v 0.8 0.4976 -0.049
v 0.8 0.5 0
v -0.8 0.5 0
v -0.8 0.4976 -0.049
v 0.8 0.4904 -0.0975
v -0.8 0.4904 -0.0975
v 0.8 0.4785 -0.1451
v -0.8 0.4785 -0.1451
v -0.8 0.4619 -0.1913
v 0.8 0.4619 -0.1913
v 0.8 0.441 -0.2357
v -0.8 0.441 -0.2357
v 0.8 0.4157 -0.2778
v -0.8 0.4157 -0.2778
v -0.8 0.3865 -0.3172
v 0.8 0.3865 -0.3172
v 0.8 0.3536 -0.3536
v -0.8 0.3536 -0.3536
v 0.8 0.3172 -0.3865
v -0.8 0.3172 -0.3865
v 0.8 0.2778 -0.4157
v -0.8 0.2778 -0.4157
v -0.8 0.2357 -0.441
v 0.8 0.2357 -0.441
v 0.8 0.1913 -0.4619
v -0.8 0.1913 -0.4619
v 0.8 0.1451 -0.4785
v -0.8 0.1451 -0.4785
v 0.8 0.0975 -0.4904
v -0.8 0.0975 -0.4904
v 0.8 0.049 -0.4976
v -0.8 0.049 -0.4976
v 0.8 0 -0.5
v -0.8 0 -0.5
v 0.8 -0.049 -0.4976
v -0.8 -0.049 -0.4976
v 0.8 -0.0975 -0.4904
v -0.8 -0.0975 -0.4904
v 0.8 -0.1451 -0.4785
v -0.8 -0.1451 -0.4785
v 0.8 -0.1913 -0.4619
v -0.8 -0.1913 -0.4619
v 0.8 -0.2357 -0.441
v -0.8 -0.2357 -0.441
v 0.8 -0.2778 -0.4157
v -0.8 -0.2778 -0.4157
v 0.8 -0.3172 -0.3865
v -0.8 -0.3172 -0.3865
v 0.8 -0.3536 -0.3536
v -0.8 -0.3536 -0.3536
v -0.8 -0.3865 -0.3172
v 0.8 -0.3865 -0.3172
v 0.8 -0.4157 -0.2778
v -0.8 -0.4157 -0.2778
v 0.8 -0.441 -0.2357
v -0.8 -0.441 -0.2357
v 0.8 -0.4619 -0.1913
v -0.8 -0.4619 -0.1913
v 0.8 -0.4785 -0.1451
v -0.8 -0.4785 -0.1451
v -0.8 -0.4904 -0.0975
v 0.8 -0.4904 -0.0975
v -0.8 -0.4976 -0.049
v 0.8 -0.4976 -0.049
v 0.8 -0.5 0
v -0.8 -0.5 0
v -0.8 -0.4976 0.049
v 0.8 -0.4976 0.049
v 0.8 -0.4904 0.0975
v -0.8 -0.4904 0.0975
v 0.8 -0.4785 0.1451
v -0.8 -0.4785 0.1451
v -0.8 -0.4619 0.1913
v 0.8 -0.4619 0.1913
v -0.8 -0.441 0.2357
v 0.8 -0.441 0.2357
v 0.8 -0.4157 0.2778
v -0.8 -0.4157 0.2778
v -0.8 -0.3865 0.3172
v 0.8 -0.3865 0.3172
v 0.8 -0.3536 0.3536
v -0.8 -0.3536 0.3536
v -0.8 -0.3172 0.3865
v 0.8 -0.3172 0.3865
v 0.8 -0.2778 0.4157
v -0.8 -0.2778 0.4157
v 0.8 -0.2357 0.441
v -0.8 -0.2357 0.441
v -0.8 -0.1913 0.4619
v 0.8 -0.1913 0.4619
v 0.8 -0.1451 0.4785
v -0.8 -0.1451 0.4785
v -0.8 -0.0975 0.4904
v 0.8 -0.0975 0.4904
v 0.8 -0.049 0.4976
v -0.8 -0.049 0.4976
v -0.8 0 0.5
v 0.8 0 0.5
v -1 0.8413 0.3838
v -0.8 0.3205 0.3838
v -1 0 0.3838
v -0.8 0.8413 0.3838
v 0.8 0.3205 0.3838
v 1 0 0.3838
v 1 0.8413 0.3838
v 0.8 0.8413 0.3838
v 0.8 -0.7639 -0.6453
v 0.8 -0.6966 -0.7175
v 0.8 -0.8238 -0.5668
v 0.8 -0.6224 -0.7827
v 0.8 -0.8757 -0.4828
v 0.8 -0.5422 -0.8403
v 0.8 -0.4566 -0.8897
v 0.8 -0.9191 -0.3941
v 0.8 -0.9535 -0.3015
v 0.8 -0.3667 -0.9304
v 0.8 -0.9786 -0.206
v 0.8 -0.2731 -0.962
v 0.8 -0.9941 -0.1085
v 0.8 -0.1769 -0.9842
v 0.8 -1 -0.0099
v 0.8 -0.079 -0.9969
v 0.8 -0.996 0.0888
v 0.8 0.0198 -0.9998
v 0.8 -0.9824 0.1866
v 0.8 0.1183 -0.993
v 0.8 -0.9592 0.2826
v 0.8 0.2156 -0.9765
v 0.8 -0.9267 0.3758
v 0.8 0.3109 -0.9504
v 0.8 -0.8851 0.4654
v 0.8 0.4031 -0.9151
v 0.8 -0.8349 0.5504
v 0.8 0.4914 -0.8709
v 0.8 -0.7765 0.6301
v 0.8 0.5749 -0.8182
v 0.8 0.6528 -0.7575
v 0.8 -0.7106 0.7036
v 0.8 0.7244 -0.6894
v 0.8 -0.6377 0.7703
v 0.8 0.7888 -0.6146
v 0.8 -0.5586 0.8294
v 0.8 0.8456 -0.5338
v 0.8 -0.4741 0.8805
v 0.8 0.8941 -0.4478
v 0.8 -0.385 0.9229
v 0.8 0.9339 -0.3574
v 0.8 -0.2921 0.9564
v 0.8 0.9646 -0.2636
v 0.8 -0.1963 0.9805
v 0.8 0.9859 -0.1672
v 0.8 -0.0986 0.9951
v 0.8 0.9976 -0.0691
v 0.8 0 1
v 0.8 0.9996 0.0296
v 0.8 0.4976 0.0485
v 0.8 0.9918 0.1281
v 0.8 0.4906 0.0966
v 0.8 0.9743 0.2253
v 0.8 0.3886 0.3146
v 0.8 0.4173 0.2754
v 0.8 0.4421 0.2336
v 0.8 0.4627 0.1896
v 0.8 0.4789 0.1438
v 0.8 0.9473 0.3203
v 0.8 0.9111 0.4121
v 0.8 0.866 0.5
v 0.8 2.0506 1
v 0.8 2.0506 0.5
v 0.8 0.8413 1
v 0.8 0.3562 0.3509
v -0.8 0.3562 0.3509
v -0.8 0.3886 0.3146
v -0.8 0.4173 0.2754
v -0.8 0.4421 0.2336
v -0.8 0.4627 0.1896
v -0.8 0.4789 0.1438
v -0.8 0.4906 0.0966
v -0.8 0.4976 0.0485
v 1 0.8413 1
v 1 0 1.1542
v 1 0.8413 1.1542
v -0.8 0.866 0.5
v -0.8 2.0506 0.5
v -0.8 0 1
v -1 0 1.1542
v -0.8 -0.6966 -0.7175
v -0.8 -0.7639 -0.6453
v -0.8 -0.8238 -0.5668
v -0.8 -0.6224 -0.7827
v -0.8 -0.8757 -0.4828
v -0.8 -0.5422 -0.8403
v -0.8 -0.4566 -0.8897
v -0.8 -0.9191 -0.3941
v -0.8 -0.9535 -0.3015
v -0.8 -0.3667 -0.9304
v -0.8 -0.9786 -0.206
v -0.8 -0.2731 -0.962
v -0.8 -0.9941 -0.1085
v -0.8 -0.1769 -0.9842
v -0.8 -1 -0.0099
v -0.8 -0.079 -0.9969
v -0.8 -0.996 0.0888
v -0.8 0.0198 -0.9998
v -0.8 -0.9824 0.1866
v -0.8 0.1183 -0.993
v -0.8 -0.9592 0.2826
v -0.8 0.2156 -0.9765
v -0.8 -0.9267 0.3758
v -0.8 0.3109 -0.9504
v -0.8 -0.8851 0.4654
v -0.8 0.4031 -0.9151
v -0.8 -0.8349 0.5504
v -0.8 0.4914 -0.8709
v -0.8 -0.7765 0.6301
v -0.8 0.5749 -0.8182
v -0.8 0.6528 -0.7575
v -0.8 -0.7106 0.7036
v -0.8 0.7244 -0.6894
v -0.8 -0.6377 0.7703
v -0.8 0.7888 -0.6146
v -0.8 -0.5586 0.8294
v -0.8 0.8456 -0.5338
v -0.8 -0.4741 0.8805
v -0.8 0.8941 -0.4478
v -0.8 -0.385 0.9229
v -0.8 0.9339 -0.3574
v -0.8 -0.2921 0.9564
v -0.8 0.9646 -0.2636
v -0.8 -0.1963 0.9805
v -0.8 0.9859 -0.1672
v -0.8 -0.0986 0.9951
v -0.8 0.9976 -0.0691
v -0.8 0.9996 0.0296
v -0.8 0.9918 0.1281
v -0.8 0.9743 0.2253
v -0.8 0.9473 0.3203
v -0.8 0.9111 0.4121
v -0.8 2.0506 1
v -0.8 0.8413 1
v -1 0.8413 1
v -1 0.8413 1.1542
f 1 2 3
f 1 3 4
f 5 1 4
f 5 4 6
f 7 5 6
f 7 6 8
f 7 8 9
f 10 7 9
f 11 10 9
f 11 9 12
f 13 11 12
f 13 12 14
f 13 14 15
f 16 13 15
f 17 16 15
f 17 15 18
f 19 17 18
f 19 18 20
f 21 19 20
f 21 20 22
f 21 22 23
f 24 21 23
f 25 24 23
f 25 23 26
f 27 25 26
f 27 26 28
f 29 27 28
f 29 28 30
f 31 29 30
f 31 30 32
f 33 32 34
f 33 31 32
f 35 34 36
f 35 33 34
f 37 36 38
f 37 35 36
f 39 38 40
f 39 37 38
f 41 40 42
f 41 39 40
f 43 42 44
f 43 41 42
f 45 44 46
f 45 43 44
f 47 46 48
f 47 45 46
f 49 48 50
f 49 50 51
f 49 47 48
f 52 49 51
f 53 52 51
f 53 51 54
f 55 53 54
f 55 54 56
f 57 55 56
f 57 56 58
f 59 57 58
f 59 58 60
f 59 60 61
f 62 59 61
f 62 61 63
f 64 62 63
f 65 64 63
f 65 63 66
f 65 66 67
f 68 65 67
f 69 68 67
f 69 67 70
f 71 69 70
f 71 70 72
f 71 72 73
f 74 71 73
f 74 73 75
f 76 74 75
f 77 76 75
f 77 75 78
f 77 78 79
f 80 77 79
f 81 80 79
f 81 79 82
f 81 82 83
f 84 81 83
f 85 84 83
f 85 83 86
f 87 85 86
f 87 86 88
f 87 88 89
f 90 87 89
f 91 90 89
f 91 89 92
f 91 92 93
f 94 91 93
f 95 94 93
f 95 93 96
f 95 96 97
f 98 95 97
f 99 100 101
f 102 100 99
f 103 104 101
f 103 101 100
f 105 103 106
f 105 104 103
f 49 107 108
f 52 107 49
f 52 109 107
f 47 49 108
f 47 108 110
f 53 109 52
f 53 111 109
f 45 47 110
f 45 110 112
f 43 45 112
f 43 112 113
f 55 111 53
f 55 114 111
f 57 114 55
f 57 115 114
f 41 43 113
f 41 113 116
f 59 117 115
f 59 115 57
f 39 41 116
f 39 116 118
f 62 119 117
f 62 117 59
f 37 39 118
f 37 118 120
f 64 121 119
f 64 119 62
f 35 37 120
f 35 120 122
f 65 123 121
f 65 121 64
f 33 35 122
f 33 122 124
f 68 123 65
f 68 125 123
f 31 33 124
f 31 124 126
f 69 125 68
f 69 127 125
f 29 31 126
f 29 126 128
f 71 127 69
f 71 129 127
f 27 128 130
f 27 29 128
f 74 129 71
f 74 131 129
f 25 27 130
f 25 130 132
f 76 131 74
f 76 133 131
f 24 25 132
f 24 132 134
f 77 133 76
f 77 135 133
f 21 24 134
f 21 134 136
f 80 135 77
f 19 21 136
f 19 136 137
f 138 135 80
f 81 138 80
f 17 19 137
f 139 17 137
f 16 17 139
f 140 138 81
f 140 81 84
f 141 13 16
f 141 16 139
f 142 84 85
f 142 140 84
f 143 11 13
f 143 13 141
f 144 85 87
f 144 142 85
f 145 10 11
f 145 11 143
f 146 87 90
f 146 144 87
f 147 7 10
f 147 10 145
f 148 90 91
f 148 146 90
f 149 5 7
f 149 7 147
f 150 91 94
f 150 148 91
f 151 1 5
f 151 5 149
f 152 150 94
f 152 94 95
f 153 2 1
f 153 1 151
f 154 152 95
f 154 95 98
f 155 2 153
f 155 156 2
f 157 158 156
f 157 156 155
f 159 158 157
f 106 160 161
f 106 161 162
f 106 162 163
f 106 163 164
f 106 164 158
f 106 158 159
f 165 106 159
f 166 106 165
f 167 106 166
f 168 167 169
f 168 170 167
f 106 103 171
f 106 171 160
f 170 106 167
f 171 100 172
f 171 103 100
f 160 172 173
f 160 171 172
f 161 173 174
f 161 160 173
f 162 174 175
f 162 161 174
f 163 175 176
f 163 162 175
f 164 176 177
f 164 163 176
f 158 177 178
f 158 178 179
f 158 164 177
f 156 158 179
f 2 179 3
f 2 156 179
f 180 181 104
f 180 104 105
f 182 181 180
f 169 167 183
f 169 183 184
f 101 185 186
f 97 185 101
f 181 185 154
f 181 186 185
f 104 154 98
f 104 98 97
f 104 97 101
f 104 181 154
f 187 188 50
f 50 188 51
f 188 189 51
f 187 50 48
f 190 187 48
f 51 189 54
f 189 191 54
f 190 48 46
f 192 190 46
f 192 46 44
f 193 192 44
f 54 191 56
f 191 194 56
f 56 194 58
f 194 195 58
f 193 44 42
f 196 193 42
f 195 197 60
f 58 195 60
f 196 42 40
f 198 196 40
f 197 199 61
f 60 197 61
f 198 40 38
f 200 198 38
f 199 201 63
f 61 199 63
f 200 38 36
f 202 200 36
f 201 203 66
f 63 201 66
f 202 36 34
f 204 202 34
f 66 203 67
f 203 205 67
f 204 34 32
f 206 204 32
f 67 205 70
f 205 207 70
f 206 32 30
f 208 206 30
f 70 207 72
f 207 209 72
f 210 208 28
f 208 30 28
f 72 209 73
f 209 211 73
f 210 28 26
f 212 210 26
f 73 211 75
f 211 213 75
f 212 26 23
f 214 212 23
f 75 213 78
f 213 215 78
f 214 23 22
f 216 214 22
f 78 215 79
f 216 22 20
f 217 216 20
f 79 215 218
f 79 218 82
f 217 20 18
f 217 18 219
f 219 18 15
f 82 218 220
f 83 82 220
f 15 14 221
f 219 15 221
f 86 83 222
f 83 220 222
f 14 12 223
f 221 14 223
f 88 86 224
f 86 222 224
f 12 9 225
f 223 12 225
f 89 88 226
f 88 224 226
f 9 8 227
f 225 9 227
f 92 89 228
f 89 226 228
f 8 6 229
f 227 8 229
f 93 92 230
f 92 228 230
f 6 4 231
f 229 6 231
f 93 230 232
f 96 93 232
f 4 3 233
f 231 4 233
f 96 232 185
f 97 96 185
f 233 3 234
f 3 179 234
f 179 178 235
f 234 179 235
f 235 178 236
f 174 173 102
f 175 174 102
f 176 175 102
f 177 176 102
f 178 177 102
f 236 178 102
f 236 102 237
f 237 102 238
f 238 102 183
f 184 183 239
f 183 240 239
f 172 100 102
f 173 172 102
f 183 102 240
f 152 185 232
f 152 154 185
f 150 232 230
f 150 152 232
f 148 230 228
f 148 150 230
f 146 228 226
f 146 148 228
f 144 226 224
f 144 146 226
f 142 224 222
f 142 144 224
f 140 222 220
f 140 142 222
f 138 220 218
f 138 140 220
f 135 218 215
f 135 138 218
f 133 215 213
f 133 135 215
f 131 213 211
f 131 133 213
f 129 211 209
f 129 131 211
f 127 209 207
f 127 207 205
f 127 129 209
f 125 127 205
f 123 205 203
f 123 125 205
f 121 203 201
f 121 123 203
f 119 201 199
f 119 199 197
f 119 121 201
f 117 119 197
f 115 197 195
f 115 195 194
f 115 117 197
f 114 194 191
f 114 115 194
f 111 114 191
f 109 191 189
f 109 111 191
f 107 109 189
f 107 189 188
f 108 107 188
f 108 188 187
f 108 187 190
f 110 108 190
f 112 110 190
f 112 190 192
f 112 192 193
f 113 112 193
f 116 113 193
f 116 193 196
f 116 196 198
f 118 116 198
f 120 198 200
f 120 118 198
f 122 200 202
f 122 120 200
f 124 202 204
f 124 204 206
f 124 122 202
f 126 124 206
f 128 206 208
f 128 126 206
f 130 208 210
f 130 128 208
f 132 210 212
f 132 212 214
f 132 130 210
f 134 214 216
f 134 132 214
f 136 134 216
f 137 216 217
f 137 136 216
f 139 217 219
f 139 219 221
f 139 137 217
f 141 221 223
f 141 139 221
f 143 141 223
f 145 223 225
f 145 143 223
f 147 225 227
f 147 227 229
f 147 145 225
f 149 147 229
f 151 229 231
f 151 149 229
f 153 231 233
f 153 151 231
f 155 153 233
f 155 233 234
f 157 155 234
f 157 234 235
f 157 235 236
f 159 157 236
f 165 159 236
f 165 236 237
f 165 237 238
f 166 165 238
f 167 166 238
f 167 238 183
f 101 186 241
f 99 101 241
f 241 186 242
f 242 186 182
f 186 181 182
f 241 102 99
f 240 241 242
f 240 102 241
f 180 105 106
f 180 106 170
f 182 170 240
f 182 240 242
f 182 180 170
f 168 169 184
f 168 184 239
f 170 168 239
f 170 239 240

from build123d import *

# Parameters (mm, degrees)
F1_DEPTH = 0.8
F0_W     = 0.8412975585
F0_H     = 0.1542318389
F2_DEPTH = 1


with BuildPart() as f1:
    # F0 (on Right) → F1 (new body, symmetric)
    with BuildSketch(Plane.YZ):
        with BuildLine():
            ThreePointArc((0.3204790504, 0.383787934), (0.4529014933, 0.2118495631), (0.5, 0))
            ThreePointArc((0.5, 0), (-0.3535533906, -0.3535533906), (0, 0.5))
            Line((0, 0.5), (0, 1))
            ThreePointArc((0, 1), (-0.5, -0.8660254038), (0.8660254038, 0.5))
            Line((0.8660254038, 0.5), (2.0505674183, 0.5))
            Line((2.0505674183, 0.5), (2.0505674183, 1))
            Line((2.0505674183, 1), (1.2247448714, 1))
            Line((1.2247448714, 1), (0.8412975585, 1))
            Line((0.8412975585, 1), (0.8412975585, 0.383787934))
            Line((0.8412975585, 0.383787934), (0.3204790504, 0.383787934))
        make_face()
        with BuildLine():
            ThreePointArc((0, 0.5), (0.1704494544, 0.4700499798), (0.3204790504, 0.383787934))
            Line((0.3204790504, 0.383787934), (0.8412975585, 0.383787934))
            Line((0.8412975585, 0.383787934), (0.8412975585, 1))
            Line((0.8412975585, 1), (0, 1))
            Line((0, 1), (0, 0.5))
        make_face()
    extrude(amount=F1_DEPTH, both=True)

    # F0 (on Right) → F2 (join, symmetric)
    with BuildSketch(Plane.YZ):
        with Locations((0.4206487793, 1.0771159194)):
            Rectangle(F0_W, F0_H)
        with BuildLine():
            Line((0, 0.383787934), (0.3204790504, 0.383787934))
            ThreePointArc((0.3204790504, 0.383787934), (0.1704494544, 0.4700499798), (0, 0.5))
            Line((0, 0.5), (0, 0.383787934))
        make_face()
        with BuildLine():
            ThreePointArc((0, 0.5), (0.1704494544, 0.4700499798), (0.3204790504, 0.383787934))
            Line((0.3204790504, 0.383787934), (0.8412975585, 0.383787934))
            Line((0.8412975585, 0.383787934), (0.8412975585, 1))
            Line((0.8412975585, 1), (0, 1))
            Line((0, 1), (0, 0.5))
        make_face()
    extrude(amount=F2_DEPTH, both=True)


solid = f1.part
